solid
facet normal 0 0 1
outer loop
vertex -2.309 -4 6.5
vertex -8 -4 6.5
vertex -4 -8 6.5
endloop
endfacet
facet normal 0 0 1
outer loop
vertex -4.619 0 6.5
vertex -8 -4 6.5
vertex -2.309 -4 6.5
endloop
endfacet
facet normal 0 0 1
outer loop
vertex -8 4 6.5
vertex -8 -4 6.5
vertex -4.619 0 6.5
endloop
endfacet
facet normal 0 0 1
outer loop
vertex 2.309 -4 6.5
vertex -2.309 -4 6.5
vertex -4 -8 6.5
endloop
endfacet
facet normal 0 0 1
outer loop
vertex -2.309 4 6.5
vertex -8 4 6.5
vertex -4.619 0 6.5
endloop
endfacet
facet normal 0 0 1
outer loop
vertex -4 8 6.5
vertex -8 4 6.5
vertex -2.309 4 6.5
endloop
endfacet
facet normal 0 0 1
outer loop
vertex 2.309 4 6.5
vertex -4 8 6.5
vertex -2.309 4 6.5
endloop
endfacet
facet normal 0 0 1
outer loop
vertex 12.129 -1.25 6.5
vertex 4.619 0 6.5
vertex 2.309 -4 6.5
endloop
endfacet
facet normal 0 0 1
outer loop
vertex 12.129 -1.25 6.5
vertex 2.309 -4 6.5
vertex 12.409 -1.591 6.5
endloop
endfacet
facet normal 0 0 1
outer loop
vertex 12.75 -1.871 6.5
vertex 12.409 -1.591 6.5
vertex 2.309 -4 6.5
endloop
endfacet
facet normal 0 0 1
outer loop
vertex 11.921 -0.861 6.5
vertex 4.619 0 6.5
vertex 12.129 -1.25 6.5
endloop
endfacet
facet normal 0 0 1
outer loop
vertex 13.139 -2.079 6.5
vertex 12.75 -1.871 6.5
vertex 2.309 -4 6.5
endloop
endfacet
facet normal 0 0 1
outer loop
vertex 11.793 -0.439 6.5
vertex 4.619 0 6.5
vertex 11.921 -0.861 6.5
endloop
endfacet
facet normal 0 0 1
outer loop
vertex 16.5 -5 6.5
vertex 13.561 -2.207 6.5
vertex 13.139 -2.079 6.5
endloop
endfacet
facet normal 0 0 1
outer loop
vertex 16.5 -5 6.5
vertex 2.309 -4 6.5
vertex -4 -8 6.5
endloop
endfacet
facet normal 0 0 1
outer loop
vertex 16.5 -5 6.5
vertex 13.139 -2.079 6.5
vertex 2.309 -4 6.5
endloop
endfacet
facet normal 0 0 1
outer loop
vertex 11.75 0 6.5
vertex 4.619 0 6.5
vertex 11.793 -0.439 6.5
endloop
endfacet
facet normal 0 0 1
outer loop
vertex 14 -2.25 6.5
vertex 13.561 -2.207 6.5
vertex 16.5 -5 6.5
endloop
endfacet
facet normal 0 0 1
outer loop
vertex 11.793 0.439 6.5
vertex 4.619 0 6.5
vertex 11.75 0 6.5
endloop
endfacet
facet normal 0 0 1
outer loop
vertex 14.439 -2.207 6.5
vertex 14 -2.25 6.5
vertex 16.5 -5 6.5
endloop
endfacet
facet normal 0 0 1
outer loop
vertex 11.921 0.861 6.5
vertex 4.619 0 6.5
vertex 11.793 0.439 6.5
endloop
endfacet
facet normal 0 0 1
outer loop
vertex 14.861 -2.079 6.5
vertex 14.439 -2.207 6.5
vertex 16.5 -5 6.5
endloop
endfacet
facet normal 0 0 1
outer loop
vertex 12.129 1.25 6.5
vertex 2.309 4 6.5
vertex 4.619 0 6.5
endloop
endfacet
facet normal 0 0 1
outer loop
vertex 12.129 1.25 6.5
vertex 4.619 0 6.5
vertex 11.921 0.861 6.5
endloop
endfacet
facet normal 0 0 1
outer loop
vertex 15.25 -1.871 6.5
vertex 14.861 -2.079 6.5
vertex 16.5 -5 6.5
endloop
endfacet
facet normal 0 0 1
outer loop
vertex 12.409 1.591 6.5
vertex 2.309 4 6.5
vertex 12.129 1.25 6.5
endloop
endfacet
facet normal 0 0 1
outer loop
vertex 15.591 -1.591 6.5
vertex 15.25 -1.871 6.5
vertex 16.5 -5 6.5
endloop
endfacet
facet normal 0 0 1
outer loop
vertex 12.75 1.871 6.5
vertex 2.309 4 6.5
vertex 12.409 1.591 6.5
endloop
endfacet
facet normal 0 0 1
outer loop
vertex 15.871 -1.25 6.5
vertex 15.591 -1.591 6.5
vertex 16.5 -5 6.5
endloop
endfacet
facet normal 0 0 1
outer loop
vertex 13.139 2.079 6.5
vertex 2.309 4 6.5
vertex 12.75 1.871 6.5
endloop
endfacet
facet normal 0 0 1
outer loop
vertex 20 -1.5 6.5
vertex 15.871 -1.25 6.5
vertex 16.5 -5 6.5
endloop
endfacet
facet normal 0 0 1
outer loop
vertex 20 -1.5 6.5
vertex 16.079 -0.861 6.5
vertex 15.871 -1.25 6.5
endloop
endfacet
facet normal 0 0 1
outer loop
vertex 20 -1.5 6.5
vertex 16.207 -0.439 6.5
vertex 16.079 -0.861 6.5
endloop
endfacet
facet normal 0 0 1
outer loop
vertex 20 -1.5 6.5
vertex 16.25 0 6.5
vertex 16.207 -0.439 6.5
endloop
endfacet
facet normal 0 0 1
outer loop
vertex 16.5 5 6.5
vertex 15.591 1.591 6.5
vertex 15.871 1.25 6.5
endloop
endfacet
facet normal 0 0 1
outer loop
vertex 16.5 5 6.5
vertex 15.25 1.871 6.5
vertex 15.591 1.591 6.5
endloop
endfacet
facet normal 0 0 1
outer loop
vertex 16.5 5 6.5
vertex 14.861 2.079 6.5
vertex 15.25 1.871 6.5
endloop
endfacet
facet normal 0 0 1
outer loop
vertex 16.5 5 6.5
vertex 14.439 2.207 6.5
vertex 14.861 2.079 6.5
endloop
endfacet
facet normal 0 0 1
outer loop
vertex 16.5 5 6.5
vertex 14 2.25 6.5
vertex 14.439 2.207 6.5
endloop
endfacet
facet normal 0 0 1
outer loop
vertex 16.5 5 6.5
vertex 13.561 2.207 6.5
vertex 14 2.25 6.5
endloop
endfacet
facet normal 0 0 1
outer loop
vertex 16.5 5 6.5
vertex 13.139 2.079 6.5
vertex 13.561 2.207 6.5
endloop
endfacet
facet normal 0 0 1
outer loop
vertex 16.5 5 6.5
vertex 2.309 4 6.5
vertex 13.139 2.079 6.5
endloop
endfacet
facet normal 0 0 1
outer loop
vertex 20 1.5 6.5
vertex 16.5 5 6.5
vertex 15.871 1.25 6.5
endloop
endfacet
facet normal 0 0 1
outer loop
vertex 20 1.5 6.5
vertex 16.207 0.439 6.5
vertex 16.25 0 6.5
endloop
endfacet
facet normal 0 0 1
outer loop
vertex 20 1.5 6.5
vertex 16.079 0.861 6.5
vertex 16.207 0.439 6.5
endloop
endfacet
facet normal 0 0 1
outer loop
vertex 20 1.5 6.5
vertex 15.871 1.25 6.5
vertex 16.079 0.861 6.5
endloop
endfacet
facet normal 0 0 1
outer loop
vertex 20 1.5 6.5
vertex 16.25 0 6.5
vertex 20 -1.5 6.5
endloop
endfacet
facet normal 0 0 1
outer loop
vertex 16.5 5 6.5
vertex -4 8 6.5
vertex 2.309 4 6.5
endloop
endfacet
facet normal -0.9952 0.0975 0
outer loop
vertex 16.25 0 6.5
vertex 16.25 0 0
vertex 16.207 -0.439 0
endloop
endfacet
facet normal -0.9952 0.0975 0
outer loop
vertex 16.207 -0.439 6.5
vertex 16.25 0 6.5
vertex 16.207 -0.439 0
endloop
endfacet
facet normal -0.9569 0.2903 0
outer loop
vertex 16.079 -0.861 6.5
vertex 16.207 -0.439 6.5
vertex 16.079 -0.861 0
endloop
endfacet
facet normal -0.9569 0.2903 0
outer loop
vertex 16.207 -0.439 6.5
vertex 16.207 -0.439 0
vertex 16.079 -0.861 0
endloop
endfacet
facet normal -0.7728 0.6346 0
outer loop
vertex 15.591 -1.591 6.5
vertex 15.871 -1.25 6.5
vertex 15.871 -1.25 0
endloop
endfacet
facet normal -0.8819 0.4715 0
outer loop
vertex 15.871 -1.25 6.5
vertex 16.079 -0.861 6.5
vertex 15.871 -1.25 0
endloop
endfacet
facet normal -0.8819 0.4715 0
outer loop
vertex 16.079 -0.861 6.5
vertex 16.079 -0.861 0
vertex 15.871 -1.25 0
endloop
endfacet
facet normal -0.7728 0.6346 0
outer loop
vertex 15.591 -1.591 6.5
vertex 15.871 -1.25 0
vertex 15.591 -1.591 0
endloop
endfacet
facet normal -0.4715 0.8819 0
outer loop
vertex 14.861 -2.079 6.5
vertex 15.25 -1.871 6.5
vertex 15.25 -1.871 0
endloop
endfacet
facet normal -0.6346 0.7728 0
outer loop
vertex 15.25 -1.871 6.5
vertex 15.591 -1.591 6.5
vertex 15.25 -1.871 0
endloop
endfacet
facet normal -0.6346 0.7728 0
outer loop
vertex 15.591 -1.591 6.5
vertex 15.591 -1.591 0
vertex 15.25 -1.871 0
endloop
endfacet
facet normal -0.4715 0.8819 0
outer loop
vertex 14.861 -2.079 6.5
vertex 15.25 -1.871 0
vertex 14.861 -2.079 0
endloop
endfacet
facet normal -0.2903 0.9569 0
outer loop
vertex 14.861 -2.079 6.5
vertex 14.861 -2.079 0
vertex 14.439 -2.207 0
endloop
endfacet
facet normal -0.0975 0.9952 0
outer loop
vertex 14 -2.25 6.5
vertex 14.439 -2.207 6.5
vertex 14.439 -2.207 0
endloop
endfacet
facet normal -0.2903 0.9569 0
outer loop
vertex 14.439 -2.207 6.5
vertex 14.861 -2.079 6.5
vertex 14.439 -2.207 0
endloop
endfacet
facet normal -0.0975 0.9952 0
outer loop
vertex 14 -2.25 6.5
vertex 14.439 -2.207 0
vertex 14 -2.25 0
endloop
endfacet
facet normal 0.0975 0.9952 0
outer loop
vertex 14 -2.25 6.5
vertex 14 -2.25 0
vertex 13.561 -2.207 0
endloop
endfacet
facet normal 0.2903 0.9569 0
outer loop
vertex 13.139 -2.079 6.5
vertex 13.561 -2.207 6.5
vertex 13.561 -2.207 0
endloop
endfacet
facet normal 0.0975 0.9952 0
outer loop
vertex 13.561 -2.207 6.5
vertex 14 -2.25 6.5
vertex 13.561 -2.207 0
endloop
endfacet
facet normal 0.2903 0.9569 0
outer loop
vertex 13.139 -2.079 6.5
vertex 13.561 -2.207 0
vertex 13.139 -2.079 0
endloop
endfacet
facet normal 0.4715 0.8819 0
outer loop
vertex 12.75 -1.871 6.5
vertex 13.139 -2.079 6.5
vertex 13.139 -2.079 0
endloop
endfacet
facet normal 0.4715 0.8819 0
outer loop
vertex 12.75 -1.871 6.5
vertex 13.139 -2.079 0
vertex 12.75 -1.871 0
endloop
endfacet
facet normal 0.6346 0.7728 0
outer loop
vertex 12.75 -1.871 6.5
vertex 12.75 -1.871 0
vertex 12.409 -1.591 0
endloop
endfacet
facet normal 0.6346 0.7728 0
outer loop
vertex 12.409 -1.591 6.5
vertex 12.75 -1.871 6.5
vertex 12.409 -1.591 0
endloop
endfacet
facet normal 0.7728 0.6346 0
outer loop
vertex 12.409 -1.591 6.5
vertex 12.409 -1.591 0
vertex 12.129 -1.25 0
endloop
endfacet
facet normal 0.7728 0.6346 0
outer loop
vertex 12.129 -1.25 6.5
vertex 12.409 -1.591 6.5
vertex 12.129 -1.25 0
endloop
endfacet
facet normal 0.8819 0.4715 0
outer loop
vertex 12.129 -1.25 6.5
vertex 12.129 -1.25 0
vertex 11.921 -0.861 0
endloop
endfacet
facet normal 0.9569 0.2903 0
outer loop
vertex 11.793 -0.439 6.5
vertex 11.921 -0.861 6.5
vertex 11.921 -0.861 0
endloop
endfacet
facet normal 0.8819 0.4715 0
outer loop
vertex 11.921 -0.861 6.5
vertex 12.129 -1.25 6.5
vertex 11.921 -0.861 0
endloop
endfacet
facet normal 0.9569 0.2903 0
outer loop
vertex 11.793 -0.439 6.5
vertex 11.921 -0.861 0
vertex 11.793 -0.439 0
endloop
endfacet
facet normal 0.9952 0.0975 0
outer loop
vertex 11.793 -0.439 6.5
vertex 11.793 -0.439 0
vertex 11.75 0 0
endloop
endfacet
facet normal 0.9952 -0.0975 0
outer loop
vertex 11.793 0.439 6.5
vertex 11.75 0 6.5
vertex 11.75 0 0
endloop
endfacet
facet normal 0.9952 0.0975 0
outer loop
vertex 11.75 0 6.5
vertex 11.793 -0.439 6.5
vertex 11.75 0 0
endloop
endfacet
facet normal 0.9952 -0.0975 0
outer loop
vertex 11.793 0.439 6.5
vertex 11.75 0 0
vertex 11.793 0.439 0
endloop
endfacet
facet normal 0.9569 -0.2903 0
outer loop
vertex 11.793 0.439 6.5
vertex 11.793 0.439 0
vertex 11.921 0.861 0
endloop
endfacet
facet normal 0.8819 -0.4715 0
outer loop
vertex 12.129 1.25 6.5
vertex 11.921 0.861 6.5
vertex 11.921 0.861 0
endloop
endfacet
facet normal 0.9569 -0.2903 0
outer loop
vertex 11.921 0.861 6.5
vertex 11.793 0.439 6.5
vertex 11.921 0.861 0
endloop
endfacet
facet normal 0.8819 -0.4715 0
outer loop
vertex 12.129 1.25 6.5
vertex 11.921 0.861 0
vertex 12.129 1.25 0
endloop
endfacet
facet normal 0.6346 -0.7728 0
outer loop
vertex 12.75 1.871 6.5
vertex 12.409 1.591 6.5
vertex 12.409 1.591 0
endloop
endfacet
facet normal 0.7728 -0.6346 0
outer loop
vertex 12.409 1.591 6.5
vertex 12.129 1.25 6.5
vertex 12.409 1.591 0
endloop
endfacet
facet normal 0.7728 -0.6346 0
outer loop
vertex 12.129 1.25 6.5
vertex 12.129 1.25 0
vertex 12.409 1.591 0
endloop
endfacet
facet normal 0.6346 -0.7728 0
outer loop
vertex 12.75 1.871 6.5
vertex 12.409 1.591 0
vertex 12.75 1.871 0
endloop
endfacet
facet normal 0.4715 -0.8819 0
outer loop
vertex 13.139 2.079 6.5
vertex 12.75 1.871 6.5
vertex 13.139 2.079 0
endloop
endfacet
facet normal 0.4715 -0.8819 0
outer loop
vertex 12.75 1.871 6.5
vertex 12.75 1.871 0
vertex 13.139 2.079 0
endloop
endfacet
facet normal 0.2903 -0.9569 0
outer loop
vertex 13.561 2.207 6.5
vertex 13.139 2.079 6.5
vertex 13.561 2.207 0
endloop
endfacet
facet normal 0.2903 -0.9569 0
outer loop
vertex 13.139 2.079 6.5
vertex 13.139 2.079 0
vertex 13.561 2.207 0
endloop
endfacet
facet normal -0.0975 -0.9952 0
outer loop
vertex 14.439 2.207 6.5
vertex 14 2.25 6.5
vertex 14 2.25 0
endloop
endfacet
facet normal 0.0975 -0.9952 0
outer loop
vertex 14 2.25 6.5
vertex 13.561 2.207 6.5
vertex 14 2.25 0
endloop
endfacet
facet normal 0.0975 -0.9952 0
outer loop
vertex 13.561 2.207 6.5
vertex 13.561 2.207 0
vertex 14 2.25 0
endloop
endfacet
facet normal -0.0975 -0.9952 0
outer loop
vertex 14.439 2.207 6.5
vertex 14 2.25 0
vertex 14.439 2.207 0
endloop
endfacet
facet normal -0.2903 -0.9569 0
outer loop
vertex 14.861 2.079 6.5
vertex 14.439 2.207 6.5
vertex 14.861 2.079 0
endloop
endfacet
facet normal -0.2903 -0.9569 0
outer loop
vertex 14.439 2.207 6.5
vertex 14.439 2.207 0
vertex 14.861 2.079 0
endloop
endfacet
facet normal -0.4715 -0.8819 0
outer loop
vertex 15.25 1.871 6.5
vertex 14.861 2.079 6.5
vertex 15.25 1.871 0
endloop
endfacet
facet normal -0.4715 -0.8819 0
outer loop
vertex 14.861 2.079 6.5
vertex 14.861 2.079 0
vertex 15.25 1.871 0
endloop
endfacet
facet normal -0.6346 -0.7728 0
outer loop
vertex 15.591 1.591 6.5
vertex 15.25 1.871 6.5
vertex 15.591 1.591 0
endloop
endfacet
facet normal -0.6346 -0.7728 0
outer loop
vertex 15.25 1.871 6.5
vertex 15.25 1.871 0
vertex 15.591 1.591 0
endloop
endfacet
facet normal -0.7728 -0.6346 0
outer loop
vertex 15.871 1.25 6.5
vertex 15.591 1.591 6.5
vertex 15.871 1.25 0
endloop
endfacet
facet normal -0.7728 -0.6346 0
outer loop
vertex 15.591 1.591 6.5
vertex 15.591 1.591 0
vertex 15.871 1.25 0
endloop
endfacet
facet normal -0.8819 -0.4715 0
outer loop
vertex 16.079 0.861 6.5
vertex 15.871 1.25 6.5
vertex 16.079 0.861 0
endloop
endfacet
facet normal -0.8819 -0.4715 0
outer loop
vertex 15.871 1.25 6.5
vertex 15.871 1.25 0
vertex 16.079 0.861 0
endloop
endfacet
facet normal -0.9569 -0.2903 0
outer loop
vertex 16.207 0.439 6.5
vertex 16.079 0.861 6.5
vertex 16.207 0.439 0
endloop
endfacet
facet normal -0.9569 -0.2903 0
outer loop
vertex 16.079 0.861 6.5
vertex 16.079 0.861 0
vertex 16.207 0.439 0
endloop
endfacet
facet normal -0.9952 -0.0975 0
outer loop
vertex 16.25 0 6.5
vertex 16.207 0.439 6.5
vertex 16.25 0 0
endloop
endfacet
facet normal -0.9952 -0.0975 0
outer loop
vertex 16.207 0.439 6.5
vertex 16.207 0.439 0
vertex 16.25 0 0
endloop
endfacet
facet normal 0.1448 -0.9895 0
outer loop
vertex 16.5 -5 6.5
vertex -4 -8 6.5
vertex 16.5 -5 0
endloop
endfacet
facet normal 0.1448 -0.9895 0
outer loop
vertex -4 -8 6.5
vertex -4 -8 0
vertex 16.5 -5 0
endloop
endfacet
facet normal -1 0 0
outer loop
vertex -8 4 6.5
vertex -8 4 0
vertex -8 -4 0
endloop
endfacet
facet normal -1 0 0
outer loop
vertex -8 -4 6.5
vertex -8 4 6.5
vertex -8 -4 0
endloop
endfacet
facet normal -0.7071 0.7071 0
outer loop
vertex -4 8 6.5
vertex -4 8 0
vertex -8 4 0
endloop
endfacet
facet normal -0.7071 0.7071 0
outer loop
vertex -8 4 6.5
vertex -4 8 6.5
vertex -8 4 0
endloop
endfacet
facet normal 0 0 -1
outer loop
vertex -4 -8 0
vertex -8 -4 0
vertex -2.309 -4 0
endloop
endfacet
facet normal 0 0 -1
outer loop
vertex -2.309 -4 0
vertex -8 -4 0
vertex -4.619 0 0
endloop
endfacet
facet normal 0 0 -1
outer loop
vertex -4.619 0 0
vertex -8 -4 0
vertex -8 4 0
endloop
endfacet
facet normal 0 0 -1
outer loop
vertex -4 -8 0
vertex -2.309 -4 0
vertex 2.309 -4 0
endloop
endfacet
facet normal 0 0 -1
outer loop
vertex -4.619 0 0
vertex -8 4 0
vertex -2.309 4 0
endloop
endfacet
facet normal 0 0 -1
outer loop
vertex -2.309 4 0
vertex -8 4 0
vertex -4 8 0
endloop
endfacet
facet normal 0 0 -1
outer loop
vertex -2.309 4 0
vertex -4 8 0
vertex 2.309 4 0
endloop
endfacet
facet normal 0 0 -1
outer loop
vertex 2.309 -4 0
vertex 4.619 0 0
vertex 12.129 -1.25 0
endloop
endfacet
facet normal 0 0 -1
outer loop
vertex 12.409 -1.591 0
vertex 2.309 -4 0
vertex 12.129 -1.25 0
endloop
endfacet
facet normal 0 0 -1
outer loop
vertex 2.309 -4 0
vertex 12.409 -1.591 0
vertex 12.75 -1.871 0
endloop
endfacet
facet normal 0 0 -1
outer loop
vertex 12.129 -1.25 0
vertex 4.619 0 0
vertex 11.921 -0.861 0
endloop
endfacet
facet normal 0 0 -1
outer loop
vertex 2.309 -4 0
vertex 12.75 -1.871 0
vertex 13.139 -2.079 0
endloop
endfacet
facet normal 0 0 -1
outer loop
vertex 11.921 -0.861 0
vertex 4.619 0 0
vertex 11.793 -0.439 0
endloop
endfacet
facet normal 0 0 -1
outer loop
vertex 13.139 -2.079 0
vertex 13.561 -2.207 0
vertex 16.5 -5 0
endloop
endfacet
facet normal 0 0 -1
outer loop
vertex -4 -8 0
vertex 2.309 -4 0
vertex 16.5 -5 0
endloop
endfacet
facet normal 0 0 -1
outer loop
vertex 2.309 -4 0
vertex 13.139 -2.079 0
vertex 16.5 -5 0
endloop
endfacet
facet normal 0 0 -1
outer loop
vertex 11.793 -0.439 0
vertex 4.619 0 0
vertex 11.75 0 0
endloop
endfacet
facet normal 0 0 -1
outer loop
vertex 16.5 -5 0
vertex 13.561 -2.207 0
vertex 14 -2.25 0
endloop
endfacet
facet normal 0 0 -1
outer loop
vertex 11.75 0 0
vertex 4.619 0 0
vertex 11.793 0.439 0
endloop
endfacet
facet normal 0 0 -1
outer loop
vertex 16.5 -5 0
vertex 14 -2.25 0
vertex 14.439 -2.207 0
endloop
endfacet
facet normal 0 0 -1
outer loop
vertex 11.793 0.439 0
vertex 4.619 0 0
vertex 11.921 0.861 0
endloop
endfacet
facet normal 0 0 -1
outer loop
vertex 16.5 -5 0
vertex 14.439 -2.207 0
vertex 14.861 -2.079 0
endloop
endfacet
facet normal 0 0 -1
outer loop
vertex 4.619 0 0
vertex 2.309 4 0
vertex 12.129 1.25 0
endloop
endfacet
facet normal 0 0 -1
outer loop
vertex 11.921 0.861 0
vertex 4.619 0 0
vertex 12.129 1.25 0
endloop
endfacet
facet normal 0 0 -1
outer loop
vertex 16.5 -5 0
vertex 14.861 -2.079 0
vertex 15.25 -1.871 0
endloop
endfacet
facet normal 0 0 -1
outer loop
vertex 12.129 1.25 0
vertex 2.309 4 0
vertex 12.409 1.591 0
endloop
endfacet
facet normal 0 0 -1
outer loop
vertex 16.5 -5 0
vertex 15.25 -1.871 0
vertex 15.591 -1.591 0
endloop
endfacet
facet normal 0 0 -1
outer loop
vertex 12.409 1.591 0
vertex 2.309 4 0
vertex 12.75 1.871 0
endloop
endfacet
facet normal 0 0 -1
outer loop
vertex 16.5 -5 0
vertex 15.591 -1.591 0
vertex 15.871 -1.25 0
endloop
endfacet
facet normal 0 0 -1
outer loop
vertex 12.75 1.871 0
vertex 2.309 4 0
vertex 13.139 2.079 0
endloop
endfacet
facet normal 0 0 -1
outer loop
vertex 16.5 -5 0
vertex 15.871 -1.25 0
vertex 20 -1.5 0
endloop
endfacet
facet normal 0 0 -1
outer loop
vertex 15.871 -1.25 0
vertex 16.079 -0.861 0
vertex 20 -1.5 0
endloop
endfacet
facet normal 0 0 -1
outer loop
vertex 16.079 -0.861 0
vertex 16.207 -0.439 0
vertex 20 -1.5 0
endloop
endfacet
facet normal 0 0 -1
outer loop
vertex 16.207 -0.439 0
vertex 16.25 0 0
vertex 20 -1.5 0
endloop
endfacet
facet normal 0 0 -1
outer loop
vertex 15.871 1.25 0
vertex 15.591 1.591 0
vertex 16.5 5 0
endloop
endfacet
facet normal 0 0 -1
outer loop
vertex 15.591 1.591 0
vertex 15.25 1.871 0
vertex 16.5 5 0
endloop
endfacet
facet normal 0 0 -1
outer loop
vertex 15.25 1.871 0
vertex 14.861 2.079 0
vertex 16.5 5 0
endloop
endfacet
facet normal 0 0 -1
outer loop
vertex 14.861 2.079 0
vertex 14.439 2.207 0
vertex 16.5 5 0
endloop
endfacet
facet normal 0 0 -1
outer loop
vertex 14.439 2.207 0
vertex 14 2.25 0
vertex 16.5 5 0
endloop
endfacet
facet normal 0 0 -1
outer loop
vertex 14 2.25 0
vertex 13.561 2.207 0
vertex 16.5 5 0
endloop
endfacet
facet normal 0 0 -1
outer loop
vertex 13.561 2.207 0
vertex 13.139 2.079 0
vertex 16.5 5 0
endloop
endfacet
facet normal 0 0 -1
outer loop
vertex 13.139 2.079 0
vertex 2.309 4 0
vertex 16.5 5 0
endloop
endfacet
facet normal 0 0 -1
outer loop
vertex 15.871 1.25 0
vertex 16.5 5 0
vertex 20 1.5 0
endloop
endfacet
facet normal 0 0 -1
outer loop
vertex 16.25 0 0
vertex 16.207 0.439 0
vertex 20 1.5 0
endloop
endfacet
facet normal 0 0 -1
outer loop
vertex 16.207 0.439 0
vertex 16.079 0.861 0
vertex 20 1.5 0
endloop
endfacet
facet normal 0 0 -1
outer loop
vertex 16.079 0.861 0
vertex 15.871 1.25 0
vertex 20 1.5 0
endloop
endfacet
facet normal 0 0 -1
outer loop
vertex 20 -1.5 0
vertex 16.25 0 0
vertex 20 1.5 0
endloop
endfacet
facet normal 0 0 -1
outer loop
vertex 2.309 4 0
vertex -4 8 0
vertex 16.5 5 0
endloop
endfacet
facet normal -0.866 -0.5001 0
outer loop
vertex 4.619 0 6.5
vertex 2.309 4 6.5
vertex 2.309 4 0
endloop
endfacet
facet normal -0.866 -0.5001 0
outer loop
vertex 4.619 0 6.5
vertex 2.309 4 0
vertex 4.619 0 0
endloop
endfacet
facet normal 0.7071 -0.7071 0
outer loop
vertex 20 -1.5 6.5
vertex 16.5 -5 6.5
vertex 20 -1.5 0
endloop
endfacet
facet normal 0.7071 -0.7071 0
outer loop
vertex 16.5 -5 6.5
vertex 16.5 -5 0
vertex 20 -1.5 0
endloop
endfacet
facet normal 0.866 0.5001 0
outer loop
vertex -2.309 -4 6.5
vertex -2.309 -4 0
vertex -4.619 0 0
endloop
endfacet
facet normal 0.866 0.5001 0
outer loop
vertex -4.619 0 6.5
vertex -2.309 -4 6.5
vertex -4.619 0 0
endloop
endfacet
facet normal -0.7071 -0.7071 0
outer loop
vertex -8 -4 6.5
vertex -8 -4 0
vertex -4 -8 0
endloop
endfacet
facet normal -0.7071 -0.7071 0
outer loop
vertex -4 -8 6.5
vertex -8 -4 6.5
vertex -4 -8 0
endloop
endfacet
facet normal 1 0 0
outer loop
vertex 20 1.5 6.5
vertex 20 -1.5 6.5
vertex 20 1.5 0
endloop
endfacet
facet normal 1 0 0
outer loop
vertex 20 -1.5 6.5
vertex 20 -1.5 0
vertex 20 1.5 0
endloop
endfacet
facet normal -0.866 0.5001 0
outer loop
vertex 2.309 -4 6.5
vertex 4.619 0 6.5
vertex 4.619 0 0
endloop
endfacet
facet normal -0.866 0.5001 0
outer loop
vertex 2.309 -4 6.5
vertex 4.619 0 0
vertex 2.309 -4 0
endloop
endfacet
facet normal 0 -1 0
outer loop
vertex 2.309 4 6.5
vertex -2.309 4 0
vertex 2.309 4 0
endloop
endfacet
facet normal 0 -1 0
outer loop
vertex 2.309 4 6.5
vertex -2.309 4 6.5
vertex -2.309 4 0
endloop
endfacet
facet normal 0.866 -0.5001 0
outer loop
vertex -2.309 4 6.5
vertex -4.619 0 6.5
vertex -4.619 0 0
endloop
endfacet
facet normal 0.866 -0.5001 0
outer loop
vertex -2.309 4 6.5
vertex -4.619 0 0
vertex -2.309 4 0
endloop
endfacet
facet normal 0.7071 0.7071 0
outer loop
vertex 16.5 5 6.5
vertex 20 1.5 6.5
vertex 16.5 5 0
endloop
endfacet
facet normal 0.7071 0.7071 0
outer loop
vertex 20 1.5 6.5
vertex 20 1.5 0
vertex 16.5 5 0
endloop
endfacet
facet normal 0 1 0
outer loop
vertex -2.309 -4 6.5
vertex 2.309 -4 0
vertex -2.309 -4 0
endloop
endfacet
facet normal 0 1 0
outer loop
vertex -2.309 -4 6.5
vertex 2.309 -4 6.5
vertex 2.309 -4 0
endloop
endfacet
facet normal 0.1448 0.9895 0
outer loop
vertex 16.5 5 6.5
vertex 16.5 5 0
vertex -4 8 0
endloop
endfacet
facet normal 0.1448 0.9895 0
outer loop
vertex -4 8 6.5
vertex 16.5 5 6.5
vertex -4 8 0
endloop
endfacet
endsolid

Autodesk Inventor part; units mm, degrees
ref_plane "YZ Plane" through (0, 0, 0) normal (1, 0, 0) x (0, 1, 0)
ref_plane "XZ Plane" through (0, 0, 0) normal (0, 1, 0) x (-1, 0, 0)
ref_plane "XY Plane" through (0, 0, 0) normal (0, 0, 1) x (1, 0, 0)
sketch "Sketch1" plane through (0, 0, 0) normal (0, 0, 1) x (1, 0, 0)
  line L0 (-4, -8) -> (16.5, -5)
  line L1 (20, -1.5) -> (20, 1.5)
  line L2 (16.5, 5) -> (-4, 8)
  line L3 (-8, 4) -> (-8, -4)
  line L4 (-4, 8) -> (-8, 4)
  line L5 (-8, -4) -> (-4, -8)
  line L6 (16.5, -5) -> (20, -1.5)
  line L7 (20, 1.5) -> (16.5, 5)
  circle A0 centre (0, 0) radius 2.75
  circle A1 centre (14, 0) radius 2.25
  circle A2 centre (0, 0) radius 5 construction
  circle A3 centre (14, 0) radius 4.5 construction
  point P0 (-8, 0)
  point P1 (20, 0)
  dimension "d9" = 8
  dimension "d10" = 14
  dimension "d11" = 4.5
  dimension "d12" = 5.5
  dimension "d13" = 6
  dimension "d16" = 10
  dimension "d17" = 9
  dimension "d18" = 8
  dimension "d19" = 4
  dimension "d20" = 4
  dimension "d21" = 4
  dimension "d22" = 10
  dimension "d23" = 3
extrude "Extrusion1" add sketch "Sketch1" along normal blind 6.5
sketch "Sketch2" plane through (0, 0, 6.5) normal (0, 0, 1) x (1, 0, 0)
  circle A0 centre (0, 0) radius 2.75 projected
  line L0 (-8, 4) -> (-8, -4) projected
  line L1 (4.6188, 0) -> (2.3094, -4)
  line L2 (2.3094, -4) -> (-2.3094, -4)
  line L3 (-2.3094, -4) -> (-4.6188, 0)
  line L4 (-4.6188, 0) -> (-2.3094, 4)
  line L5 (-2.3094, 4) -> (2.3094, 4)
  line L6 (2.3094, 4) -> (4.6188, 0)
  dimension "d24" = 8
extrude "Extrusion2" cut sketch "Sketch2" against normal through all
properties part number "y_carriage_nut_holder_a" material "Plywood, Finish"
